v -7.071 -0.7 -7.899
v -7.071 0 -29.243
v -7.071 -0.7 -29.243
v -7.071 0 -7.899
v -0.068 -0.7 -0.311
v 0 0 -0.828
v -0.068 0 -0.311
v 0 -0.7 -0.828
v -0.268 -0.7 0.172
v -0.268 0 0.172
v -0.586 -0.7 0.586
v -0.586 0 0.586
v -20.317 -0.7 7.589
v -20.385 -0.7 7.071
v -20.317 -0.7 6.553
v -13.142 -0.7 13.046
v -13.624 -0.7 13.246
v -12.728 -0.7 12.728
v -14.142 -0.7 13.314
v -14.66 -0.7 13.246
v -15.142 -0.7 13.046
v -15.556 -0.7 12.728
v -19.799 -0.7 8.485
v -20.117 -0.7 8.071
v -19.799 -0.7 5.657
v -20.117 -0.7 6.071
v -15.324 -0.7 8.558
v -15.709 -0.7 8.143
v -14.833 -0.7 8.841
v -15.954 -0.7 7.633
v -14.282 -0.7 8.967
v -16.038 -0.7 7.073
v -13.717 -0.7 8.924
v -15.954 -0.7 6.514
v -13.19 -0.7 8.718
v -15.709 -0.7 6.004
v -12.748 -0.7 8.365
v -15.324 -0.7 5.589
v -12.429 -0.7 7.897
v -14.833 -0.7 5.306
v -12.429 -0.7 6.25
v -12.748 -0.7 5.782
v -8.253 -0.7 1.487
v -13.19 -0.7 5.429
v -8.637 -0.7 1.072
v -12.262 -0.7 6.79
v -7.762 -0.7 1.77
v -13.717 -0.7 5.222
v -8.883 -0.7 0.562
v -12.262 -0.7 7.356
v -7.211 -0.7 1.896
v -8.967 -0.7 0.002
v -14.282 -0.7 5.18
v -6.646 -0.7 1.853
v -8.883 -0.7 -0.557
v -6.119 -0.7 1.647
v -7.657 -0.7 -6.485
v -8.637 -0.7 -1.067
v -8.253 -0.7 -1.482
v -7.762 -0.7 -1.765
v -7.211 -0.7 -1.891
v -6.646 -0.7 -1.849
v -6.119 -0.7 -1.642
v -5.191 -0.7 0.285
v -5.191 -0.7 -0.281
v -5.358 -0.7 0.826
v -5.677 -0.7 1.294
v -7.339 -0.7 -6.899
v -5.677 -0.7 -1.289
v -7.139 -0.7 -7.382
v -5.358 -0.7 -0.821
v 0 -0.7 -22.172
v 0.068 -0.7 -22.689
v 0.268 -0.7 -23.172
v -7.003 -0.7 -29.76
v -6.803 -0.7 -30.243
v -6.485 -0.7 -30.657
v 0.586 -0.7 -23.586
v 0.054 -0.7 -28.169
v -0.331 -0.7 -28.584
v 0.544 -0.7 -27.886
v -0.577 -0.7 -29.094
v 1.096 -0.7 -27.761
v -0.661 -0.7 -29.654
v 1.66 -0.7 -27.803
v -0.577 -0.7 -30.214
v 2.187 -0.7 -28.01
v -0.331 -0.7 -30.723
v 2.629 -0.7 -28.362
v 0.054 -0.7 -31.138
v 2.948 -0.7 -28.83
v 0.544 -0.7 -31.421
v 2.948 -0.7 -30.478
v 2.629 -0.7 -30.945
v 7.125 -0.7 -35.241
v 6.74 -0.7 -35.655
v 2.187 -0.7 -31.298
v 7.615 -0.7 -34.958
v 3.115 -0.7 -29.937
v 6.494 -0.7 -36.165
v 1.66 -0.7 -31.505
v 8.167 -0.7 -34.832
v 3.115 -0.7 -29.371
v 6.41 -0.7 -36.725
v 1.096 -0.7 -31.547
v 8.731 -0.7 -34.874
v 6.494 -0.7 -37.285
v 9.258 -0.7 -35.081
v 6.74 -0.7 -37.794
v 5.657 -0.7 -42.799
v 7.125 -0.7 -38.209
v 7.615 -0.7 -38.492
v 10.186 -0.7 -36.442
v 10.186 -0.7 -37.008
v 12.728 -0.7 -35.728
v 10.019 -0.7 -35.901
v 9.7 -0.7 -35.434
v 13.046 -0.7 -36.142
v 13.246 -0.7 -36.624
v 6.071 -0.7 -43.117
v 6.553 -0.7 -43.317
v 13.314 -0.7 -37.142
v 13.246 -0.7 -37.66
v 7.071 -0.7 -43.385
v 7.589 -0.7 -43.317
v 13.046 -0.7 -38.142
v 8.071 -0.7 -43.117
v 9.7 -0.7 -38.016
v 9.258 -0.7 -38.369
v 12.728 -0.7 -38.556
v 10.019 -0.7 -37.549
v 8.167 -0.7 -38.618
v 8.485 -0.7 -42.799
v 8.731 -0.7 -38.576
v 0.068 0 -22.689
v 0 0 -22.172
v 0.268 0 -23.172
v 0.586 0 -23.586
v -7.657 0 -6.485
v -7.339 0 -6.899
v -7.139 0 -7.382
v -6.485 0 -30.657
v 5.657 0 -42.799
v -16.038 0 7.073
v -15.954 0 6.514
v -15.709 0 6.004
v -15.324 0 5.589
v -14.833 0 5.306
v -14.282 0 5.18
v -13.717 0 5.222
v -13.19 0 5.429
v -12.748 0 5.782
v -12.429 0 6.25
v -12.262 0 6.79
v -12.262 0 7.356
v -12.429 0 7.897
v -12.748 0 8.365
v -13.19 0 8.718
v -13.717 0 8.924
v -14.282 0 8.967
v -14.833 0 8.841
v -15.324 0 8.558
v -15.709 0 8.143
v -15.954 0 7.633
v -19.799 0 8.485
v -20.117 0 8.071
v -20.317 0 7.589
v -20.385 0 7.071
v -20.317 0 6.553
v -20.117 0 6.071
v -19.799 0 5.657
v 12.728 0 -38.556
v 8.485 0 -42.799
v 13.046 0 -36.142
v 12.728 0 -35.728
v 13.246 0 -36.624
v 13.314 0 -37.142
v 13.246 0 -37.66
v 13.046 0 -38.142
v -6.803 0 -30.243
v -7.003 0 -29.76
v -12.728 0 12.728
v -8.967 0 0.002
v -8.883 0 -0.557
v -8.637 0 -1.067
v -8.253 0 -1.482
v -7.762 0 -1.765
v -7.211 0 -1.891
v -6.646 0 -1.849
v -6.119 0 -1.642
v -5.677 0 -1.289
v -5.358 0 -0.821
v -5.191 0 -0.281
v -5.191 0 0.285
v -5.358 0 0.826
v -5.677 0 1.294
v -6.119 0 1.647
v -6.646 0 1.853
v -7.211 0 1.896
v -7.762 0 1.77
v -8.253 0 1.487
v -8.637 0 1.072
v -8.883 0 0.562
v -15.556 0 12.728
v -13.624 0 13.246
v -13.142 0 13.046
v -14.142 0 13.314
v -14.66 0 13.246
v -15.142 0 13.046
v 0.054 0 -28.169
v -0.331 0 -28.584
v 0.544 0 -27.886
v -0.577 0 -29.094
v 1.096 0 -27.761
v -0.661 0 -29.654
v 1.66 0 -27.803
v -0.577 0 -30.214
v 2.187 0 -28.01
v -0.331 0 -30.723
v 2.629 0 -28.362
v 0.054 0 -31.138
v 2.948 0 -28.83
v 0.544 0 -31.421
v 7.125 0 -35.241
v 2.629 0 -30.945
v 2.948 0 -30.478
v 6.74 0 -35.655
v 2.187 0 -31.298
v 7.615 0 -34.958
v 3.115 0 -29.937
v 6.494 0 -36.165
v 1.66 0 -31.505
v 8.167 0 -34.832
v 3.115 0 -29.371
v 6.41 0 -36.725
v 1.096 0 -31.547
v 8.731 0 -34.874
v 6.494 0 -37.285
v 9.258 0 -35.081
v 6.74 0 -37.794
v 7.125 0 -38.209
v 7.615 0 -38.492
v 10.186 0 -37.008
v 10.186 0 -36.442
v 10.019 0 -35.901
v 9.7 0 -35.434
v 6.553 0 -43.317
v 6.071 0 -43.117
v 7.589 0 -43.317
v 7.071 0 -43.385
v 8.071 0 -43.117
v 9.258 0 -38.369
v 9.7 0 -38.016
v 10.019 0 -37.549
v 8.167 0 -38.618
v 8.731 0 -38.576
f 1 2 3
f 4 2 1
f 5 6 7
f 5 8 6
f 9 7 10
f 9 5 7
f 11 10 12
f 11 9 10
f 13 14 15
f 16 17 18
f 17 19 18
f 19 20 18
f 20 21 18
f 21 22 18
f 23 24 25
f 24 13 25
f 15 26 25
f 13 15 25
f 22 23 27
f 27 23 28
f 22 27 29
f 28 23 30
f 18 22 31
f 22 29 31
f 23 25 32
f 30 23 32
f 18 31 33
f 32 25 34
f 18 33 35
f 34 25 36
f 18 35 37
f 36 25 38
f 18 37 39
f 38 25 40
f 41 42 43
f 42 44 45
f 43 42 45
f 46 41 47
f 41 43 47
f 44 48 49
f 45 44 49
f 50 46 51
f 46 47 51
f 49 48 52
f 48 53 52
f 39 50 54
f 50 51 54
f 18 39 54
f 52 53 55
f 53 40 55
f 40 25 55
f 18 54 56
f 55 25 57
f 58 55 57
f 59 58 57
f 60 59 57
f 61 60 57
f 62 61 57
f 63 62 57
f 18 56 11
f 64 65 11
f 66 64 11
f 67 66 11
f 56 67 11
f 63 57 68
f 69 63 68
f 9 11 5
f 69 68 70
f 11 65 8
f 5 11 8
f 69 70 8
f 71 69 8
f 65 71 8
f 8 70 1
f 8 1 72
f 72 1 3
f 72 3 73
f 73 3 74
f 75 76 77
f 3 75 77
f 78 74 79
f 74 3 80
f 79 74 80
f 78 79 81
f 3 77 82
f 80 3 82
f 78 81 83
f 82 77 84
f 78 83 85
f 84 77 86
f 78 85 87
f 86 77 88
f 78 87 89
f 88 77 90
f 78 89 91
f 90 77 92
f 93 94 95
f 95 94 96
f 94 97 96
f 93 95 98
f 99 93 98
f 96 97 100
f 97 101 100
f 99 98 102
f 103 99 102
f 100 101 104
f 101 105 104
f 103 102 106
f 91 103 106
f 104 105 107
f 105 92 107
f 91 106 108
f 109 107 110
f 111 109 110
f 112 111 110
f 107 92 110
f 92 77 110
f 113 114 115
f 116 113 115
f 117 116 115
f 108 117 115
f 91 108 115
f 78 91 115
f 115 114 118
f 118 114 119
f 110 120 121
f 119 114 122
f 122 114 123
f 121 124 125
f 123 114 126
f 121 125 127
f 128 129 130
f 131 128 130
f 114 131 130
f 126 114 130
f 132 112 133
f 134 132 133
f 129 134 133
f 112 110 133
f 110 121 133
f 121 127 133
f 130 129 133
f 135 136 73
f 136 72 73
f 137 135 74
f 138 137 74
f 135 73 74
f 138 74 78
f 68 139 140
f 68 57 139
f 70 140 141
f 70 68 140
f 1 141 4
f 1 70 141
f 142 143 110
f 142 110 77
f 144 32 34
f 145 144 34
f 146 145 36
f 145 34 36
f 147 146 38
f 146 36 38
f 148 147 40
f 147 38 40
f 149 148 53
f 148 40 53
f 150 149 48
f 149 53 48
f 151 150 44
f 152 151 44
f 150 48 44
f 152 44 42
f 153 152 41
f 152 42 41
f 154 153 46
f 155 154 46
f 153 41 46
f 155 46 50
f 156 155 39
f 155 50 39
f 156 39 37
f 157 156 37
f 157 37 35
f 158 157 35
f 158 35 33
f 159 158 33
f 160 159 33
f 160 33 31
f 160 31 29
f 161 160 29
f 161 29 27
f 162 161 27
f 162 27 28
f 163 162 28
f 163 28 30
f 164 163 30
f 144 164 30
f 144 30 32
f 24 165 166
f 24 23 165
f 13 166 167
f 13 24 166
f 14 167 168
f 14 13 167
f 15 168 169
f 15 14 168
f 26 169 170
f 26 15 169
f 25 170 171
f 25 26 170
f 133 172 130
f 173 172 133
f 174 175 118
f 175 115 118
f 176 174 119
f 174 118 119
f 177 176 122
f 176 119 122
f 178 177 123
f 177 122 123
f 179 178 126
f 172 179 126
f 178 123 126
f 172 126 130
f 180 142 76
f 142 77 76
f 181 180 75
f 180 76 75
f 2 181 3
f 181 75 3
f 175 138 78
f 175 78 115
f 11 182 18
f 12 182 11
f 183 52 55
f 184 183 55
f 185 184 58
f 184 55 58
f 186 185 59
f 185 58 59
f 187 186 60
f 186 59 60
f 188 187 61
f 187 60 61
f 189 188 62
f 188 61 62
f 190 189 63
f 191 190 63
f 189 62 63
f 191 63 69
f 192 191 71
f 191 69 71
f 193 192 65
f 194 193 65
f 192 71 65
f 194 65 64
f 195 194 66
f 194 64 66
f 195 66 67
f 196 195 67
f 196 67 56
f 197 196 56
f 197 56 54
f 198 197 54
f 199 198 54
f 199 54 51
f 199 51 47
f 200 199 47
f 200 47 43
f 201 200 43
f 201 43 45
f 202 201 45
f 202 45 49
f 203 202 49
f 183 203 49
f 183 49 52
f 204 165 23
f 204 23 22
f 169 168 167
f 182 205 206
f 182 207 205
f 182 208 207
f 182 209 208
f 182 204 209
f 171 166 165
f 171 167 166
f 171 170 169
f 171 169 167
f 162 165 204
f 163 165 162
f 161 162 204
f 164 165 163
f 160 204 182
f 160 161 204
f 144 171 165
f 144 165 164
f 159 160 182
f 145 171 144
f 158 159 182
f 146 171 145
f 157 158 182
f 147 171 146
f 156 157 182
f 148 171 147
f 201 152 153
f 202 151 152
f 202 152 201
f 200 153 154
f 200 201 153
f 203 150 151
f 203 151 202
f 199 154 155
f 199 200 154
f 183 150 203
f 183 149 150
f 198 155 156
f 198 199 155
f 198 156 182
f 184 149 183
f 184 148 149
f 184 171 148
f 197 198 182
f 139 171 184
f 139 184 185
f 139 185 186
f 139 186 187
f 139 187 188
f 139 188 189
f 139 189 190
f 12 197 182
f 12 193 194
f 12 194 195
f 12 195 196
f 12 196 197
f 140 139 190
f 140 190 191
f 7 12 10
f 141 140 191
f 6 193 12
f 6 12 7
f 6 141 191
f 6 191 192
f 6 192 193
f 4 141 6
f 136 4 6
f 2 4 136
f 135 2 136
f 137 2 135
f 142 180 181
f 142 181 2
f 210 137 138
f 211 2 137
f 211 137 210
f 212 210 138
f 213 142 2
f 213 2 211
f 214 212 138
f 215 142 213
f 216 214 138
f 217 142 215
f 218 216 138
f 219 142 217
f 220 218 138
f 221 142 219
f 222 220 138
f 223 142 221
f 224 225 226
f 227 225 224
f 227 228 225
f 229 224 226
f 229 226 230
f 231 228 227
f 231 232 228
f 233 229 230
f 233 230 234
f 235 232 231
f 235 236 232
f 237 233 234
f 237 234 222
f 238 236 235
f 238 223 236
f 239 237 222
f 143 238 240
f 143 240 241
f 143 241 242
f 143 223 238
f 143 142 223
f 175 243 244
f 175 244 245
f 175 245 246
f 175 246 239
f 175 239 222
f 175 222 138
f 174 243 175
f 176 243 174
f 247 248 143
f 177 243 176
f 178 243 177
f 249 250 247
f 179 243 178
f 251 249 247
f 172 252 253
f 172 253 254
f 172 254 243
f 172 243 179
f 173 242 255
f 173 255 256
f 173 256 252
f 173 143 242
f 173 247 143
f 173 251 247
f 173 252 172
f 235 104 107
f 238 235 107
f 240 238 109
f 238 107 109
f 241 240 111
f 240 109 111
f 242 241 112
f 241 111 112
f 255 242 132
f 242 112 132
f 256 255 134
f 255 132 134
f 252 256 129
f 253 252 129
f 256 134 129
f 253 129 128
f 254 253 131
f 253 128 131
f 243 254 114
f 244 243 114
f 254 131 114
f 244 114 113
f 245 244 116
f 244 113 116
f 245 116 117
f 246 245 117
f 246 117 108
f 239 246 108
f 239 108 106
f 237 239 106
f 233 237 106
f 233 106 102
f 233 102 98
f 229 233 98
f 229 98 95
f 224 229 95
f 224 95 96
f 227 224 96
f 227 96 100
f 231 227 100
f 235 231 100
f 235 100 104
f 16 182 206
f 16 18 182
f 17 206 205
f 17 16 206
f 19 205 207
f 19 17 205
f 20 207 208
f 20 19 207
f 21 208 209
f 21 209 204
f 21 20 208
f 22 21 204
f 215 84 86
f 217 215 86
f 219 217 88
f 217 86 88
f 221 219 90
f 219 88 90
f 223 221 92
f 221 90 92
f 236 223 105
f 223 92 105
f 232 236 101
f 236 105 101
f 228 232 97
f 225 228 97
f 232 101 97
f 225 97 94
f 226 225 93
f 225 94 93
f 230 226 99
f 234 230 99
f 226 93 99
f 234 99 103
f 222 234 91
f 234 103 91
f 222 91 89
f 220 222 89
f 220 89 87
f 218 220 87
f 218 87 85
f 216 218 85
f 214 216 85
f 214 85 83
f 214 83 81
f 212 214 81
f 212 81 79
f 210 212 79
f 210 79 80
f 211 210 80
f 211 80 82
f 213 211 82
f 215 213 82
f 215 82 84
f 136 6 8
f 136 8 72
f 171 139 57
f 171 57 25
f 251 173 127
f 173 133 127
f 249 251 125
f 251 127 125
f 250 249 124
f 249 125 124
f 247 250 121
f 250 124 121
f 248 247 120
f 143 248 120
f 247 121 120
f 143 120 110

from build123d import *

# Parameters (mm, degrees)
BASE_FLANGE2_DEPTH    = 0.7
F_6_CLEARANCE_HOLE1_D = 3.7973
FILLET1_R             = 2


# Sheet-metal steps are written as plain solids
with BuildPart() as part:
    # Sketch1 → Base-Flange2 (new body)
    with BuildSketch(Plane(origin=(0, 0, 0), x_dir=(1, 0, 0), z_dir=(0, 1, 0))):
        Polygon((0, 0), (0, 23), (14.142135624, 37.142135624), (7.071067812, 44.213203436), (-7.071067812, 30.071067812), (-7.071067812, 7.071067812), (-21.213203436, -7.071067812), (-14.142135624, -14.142135624), align=None)
    extrude(amount=-BASE_FLANGE2_DEPTH)

    # #6 Clearance Hole1 (through all)
    with Locations(Plane(origin=(0, 0, 0), x_dir=(1, 0, 0), z_dir=(0, 1, 0))):
        with Locations((-14.139821541, -7.073381895), (-7.068753729, -0.002314083), (1.237436867, 29.653874811), (8.308504679, 36.724942623)):
            Hole(F_6_CLEARANCE_HOLE1_D / 2)

    # Fillet1
    fillet1_edges = [part.edges().sort_by_distance(p)[0] for p in [
        (-14.142135624, -0.35, 14.142135624),
        (-21.213203436, -0.35, 7.071067812),
        (-7.071067812, -0.35, -7.071067812),
        (-7.071067812, -0.35, -30.071067812),
        (7.071067812, -0.35, -44.213203436),
        (14.142135624, -0.35, -37.142135624),
        (0, -0.35, -23),
        (0, -0.35, 0),
    ]]
    fillet(fillet1_edges, radius=FILLET1_R)


solid = part.part
